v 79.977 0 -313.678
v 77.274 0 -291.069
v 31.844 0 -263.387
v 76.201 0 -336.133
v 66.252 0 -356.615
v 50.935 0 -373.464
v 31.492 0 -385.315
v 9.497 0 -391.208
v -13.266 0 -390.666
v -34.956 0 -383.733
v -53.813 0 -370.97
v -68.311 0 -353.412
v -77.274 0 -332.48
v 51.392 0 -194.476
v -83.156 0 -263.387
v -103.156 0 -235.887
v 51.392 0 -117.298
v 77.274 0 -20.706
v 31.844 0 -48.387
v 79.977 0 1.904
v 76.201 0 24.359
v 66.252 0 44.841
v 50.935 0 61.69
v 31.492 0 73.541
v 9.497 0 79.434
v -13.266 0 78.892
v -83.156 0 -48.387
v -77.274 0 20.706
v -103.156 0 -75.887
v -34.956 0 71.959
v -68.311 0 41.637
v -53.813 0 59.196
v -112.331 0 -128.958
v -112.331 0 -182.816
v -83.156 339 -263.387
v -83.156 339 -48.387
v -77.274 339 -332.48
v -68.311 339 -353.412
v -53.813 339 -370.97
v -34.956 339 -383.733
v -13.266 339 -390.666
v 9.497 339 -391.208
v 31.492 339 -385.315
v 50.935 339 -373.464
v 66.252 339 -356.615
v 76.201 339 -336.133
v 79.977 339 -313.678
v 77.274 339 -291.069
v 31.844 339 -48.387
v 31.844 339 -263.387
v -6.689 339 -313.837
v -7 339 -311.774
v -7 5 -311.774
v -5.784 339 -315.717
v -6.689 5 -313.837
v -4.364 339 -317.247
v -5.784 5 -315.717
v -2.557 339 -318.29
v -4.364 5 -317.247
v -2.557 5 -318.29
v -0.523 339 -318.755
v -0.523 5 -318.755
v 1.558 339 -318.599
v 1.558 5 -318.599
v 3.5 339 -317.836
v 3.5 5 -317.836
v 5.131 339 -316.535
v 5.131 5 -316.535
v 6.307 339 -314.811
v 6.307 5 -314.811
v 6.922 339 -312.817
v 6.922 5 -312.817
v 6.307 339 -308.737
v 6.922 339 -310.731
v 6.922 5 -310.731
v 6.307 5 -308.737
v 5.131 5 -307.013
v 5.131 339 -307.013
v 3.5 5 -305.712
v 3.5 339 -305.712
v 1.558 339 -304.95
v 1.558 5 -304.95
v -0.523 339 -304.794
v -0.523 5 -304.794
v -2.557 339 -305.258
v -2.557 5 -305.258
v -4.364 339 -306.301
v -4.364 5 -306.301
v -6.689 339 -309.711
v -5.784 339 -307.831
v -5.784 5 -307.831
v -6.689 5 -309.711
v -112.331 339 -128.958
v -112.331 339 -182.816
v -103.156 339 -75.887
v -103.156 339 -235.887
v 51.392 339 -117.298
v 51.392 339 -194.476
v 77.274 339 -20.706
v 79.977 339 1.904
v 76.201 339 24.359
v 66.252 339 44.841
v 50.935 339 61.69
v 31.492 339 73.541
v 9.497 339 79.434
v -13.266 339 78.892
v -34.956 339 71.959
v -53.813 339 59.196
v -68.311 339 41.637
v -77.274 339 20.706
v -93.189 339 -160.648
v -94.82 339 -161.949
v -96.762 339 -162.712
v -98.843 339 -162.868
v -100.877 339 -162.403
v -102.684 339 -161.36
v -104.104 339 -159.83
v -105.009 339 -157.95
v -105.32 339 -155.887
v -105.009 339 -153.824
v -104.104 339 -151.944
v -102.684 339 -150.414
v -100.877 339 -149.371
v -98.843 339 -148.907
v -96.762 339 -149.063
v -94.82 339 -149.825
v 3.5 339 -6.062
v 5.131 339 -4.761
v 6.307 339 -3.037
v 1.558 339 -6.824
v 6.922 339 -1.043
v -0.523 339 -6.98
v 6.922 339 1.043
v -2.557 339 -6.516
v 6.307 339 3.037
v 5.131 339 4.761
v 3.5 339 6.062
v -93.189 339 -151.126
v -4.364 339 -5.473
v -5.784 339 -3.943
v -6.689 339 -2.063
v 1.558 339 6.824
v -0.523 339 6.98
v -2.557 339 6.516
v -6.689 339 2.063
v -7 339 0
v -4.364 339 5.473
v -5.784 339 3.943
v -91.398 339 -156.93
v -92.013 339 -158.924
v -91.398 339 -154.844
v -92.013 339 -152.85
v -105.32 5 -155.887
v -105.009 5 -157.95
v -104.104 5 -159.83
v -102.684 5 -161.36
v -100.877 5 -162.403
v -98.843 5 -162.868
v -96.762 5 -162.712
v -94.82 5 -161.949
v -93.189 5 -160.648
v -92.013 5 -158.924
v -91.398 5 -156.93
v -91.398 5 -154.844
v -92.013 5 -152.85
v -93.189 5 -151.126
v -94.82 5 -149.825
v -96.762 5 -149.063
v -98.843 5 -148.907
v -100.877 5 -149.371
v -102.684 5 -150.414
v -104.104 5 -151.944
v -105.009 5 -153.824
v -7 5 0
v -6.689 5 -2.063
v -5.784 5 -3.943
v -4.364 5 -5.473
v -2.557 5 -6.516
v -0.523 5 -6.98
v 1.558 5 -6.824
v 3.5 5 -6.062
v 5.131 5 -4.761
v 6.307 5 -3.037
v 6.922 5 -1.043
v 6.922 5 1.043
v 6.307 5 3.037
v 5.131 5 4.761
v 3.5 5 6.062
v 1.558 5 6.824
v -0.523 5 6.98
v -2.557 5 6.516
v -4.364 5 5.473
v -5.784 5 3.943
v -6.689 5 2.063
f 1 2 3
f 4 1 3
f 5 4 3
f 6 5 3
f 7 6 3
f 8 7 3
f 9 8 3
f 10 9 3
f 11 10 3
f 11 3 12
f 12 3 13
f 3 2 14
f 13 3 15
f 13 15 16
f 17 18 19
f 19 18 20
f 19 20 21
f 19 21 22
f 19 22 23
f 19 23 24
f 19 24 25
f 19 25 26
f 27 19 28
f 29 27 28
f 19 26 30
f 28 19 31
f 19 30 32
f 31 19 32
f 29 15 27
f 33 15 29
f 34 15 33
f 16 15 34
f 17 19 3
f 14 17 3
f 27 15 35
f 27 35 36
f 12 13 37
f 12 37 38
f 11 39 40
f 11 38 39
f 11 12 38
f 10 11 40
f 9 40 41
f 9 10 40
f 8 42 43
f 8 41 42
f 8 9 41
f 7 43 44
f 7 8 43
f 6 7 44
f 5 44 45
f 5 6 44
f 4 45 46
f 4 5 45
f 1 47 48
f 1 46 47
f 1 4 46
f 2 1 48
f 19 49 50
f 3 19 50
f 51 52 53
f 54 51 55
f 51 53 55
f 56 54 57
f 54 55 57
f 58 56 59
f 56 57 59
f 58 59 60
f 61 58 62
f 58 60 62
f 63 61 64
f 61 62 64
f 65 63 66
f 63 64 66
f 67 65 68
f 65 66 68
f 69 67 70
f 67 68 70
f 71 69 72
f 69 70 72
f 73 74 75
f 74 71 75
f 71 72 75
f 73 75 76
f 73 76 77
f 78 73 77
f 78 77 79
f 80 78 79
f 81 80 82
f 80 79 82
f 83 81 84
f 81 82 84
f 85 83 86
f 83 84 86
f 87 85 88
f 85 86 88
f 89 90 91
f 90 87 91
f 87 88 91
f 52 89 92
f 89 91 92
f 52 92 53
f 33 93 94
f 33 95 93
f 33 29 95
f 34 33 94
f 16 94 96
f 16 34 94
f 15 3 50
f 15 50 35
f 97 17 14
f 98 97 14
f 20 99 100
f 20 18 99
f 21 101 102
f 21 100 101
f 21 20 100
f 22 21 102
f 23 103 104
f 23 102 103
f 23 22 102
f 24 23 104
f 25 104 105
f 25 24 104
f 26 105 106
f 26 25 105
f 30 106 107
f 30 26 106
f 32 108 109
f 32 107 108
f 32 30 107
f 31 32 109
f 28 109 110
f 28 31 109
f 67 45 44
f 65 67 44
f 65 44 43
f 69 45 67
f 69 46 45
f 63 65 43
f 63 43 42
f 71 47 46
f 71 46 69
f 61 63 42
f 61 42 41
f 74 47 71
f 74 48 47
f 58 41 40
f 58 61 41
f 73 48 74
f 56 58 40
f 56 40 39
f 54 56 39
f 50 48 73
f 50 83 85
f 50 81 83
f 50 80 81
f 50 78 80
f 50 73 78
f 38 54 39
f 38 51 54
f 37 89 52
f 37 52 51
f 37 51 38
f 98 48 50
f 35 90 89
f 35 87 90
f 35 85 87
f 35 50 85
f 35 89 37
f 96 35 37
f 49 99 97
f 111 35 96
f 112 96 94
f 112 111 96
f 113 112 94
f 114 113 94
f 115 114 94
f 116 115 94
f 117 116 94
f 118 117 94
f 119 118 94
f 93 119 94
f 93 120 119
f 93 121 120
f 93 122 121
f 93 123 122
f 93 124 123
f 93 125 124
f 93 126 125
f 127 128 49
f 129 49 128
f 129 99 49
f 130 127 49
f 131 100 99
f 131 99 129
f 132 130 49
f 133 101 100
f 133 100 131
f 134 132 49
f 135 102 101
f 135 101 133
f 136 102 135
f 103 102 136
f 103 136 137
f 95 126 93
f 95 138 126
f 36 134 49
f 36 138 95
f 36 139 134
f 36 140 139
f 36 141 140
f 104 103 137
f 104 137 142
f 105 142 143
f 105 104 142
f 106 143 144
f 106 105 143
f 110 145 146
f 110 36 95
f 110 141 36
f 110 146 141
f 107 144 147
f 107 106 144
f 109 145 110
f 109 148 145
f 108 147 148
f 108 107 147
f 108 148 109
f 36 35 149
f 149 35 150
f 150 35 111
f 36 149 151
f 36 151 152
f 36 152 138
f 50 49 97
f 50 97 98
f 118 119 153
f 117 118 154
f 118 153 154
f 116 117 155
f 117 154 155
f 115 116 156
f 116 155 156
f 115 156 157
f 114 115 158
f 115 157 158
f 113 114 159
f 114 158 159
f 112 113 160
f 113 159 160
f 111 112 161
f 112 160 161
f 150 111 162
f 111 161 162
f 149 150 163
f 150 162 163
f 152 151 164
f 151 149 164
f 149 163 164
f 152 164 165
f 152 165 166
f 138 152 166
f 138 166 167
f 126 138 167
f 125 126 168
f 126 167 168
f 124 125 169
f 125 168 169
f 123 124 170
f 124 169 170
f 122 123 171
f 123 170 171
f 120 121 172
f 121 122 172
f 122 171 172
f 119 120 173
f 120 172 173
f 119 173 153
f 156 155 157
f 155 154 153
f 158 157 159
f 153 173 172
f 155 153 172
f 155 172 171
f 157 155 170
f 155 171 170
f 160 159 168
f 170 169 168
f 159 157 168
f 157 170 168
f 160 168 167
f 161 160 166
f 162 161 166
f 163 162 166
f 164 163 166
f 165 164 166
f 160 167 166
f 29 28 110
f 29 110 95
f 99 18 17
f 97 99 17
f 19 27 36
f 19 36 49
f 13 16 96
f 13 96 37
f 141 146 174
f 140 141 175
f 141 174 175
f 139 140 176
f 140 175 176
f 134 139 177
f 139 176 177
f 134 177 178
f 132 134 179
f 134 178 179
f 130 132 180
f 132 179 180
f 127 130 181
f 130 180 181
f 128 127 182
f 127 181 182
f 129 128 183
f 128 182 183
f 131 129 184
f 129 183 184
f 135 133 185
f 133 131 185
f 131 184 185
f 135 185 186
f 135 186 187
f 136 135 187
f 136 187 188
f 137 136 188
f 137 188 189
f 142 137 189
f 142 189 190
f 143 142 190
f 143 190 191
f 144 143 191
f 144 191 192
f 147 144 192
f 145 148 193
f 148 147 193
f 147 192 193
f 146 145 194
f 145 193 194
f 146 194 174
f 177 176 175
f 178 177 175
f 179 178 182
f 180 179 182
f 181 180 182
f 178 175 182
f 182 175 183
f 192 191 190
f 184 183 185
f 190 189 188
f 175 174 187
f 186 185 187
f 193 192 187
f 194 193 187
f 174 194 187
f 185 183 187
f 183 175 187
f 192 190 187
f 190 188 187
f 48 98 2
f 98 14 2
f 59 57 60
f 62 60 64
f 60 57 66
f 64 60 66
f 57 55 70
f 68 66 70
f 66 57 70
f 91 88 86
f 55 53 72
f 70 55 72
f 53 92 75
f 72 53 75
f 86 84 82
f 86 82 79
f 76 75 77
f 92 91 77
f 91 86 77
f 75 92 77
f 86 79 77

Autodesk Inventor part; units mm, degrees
ref_plane "YZ Plane" through (0, 0, 0) normal (1, 0, 0) x (0, 1, 0)
ref_plane "XZ Plane" through (0, 0, 0) normal (0, 1, 0) x (-1, 0, 0)
ref_plane "XY Plane" through (0, 0, 0) normal (0, 0, 1) x (1, 0, 0)
sketch "Sketch2" plane through (0, 0, 0) normal (0, 1, 0) x (-1, 0, 0)
  circle A0 centre (0, 0) radius 80 construction
  line L0 (77.2741, 20.7055) -> (103.156, -75.8871)
  line L1 (-77.2741, -20.7055) -> (-51.3922, -117.2981)
  line L2 (103.156, -75.8871) -> (-51.3922, -117.2981) construction
  line L3 (103.156, -75.8871) -> (103.156, -235.8871) construction
  line L4 (103.156, -235.8871) -> (-51.3922, -194.476) construction
  line L5 (-51.3922, -117.2981) -> (-51.3922, -194.476)
  circle A1 centre (0, -311.7741) radius 80 construction
  line L6 (-51.3922, -194.476) -> (-77.2741, -291.0686)
  line L7 (103.156, -235.8871) -> (77.2741, -332.4796)
  arc A2 (77.2741, 20.7055) -> (-77.2741, -20.7055) centre (0, 0) ccw
  arc A3 (-77.2741, -291.0686) -> (77.2741, -332.4796) centre (0, -311.7741) ccw
  circle A4 centre (0, 0) radius 7
  circle A5 centre (0, -311.7741) radius 7
  line L8 (83.156, -48.3871) -> (-31.844, -48.3871)
  line L9 (-31.844, -48.3871) -> (-31.844, -263.3871)
  line L10 (-31.844, -263.3871) -> (83.156, -263.3871)
  line L11 (83.156, -263.3871) -> (83.156, -48.3871)
  arc A6 (103.156, -235.8871) -> (103.156, -75.8871) centre (-201.516, -155.8871) ccw
  circle A7 centre (98.32, -155.8871) radius 7
  point P0 (103.156, -155.8871)
  point P1 (83.156, -155.8871)
  dimension "d0" = 160
  dimension "d1" = 100
  dimension "d2" = 100
  dimension "d3" = 160
  dimension "d4" = 160
  dimension "d5" = 160
  dimension "d6" = 75
  dimension "d7" = 75
  dimension "d8" = 160
  dimension "d9" = 100
  dimension "d10" = 100
  dimension "d11" = 14
  dimension "d12" = 14
  dimension "d13" = 115
  dimension "d14" = 215
  dimension "d15" = 20
  dimension "d39" = 315
  dimension "d40" = 14
  dimension "d41" = 15.164
extrude "Extrusion1" add sketch "Sketch2" along normal blind 339
sketch "Sketch5" plane through (0, 0, 0) normal (0, -1, 0) x (1, 0, 0)
  circle A0 centre (-98.32, -155.8871) radius 7 projected
  circle A1 centre (0, -311.7741) radius 7 projected
  circle A2 centre (0, 0) radius 7 projected
extrude "Extrusion4" add sketch "Sketch5" against normal blind 5
properties part number "TA001" material "ABS Plastic"
